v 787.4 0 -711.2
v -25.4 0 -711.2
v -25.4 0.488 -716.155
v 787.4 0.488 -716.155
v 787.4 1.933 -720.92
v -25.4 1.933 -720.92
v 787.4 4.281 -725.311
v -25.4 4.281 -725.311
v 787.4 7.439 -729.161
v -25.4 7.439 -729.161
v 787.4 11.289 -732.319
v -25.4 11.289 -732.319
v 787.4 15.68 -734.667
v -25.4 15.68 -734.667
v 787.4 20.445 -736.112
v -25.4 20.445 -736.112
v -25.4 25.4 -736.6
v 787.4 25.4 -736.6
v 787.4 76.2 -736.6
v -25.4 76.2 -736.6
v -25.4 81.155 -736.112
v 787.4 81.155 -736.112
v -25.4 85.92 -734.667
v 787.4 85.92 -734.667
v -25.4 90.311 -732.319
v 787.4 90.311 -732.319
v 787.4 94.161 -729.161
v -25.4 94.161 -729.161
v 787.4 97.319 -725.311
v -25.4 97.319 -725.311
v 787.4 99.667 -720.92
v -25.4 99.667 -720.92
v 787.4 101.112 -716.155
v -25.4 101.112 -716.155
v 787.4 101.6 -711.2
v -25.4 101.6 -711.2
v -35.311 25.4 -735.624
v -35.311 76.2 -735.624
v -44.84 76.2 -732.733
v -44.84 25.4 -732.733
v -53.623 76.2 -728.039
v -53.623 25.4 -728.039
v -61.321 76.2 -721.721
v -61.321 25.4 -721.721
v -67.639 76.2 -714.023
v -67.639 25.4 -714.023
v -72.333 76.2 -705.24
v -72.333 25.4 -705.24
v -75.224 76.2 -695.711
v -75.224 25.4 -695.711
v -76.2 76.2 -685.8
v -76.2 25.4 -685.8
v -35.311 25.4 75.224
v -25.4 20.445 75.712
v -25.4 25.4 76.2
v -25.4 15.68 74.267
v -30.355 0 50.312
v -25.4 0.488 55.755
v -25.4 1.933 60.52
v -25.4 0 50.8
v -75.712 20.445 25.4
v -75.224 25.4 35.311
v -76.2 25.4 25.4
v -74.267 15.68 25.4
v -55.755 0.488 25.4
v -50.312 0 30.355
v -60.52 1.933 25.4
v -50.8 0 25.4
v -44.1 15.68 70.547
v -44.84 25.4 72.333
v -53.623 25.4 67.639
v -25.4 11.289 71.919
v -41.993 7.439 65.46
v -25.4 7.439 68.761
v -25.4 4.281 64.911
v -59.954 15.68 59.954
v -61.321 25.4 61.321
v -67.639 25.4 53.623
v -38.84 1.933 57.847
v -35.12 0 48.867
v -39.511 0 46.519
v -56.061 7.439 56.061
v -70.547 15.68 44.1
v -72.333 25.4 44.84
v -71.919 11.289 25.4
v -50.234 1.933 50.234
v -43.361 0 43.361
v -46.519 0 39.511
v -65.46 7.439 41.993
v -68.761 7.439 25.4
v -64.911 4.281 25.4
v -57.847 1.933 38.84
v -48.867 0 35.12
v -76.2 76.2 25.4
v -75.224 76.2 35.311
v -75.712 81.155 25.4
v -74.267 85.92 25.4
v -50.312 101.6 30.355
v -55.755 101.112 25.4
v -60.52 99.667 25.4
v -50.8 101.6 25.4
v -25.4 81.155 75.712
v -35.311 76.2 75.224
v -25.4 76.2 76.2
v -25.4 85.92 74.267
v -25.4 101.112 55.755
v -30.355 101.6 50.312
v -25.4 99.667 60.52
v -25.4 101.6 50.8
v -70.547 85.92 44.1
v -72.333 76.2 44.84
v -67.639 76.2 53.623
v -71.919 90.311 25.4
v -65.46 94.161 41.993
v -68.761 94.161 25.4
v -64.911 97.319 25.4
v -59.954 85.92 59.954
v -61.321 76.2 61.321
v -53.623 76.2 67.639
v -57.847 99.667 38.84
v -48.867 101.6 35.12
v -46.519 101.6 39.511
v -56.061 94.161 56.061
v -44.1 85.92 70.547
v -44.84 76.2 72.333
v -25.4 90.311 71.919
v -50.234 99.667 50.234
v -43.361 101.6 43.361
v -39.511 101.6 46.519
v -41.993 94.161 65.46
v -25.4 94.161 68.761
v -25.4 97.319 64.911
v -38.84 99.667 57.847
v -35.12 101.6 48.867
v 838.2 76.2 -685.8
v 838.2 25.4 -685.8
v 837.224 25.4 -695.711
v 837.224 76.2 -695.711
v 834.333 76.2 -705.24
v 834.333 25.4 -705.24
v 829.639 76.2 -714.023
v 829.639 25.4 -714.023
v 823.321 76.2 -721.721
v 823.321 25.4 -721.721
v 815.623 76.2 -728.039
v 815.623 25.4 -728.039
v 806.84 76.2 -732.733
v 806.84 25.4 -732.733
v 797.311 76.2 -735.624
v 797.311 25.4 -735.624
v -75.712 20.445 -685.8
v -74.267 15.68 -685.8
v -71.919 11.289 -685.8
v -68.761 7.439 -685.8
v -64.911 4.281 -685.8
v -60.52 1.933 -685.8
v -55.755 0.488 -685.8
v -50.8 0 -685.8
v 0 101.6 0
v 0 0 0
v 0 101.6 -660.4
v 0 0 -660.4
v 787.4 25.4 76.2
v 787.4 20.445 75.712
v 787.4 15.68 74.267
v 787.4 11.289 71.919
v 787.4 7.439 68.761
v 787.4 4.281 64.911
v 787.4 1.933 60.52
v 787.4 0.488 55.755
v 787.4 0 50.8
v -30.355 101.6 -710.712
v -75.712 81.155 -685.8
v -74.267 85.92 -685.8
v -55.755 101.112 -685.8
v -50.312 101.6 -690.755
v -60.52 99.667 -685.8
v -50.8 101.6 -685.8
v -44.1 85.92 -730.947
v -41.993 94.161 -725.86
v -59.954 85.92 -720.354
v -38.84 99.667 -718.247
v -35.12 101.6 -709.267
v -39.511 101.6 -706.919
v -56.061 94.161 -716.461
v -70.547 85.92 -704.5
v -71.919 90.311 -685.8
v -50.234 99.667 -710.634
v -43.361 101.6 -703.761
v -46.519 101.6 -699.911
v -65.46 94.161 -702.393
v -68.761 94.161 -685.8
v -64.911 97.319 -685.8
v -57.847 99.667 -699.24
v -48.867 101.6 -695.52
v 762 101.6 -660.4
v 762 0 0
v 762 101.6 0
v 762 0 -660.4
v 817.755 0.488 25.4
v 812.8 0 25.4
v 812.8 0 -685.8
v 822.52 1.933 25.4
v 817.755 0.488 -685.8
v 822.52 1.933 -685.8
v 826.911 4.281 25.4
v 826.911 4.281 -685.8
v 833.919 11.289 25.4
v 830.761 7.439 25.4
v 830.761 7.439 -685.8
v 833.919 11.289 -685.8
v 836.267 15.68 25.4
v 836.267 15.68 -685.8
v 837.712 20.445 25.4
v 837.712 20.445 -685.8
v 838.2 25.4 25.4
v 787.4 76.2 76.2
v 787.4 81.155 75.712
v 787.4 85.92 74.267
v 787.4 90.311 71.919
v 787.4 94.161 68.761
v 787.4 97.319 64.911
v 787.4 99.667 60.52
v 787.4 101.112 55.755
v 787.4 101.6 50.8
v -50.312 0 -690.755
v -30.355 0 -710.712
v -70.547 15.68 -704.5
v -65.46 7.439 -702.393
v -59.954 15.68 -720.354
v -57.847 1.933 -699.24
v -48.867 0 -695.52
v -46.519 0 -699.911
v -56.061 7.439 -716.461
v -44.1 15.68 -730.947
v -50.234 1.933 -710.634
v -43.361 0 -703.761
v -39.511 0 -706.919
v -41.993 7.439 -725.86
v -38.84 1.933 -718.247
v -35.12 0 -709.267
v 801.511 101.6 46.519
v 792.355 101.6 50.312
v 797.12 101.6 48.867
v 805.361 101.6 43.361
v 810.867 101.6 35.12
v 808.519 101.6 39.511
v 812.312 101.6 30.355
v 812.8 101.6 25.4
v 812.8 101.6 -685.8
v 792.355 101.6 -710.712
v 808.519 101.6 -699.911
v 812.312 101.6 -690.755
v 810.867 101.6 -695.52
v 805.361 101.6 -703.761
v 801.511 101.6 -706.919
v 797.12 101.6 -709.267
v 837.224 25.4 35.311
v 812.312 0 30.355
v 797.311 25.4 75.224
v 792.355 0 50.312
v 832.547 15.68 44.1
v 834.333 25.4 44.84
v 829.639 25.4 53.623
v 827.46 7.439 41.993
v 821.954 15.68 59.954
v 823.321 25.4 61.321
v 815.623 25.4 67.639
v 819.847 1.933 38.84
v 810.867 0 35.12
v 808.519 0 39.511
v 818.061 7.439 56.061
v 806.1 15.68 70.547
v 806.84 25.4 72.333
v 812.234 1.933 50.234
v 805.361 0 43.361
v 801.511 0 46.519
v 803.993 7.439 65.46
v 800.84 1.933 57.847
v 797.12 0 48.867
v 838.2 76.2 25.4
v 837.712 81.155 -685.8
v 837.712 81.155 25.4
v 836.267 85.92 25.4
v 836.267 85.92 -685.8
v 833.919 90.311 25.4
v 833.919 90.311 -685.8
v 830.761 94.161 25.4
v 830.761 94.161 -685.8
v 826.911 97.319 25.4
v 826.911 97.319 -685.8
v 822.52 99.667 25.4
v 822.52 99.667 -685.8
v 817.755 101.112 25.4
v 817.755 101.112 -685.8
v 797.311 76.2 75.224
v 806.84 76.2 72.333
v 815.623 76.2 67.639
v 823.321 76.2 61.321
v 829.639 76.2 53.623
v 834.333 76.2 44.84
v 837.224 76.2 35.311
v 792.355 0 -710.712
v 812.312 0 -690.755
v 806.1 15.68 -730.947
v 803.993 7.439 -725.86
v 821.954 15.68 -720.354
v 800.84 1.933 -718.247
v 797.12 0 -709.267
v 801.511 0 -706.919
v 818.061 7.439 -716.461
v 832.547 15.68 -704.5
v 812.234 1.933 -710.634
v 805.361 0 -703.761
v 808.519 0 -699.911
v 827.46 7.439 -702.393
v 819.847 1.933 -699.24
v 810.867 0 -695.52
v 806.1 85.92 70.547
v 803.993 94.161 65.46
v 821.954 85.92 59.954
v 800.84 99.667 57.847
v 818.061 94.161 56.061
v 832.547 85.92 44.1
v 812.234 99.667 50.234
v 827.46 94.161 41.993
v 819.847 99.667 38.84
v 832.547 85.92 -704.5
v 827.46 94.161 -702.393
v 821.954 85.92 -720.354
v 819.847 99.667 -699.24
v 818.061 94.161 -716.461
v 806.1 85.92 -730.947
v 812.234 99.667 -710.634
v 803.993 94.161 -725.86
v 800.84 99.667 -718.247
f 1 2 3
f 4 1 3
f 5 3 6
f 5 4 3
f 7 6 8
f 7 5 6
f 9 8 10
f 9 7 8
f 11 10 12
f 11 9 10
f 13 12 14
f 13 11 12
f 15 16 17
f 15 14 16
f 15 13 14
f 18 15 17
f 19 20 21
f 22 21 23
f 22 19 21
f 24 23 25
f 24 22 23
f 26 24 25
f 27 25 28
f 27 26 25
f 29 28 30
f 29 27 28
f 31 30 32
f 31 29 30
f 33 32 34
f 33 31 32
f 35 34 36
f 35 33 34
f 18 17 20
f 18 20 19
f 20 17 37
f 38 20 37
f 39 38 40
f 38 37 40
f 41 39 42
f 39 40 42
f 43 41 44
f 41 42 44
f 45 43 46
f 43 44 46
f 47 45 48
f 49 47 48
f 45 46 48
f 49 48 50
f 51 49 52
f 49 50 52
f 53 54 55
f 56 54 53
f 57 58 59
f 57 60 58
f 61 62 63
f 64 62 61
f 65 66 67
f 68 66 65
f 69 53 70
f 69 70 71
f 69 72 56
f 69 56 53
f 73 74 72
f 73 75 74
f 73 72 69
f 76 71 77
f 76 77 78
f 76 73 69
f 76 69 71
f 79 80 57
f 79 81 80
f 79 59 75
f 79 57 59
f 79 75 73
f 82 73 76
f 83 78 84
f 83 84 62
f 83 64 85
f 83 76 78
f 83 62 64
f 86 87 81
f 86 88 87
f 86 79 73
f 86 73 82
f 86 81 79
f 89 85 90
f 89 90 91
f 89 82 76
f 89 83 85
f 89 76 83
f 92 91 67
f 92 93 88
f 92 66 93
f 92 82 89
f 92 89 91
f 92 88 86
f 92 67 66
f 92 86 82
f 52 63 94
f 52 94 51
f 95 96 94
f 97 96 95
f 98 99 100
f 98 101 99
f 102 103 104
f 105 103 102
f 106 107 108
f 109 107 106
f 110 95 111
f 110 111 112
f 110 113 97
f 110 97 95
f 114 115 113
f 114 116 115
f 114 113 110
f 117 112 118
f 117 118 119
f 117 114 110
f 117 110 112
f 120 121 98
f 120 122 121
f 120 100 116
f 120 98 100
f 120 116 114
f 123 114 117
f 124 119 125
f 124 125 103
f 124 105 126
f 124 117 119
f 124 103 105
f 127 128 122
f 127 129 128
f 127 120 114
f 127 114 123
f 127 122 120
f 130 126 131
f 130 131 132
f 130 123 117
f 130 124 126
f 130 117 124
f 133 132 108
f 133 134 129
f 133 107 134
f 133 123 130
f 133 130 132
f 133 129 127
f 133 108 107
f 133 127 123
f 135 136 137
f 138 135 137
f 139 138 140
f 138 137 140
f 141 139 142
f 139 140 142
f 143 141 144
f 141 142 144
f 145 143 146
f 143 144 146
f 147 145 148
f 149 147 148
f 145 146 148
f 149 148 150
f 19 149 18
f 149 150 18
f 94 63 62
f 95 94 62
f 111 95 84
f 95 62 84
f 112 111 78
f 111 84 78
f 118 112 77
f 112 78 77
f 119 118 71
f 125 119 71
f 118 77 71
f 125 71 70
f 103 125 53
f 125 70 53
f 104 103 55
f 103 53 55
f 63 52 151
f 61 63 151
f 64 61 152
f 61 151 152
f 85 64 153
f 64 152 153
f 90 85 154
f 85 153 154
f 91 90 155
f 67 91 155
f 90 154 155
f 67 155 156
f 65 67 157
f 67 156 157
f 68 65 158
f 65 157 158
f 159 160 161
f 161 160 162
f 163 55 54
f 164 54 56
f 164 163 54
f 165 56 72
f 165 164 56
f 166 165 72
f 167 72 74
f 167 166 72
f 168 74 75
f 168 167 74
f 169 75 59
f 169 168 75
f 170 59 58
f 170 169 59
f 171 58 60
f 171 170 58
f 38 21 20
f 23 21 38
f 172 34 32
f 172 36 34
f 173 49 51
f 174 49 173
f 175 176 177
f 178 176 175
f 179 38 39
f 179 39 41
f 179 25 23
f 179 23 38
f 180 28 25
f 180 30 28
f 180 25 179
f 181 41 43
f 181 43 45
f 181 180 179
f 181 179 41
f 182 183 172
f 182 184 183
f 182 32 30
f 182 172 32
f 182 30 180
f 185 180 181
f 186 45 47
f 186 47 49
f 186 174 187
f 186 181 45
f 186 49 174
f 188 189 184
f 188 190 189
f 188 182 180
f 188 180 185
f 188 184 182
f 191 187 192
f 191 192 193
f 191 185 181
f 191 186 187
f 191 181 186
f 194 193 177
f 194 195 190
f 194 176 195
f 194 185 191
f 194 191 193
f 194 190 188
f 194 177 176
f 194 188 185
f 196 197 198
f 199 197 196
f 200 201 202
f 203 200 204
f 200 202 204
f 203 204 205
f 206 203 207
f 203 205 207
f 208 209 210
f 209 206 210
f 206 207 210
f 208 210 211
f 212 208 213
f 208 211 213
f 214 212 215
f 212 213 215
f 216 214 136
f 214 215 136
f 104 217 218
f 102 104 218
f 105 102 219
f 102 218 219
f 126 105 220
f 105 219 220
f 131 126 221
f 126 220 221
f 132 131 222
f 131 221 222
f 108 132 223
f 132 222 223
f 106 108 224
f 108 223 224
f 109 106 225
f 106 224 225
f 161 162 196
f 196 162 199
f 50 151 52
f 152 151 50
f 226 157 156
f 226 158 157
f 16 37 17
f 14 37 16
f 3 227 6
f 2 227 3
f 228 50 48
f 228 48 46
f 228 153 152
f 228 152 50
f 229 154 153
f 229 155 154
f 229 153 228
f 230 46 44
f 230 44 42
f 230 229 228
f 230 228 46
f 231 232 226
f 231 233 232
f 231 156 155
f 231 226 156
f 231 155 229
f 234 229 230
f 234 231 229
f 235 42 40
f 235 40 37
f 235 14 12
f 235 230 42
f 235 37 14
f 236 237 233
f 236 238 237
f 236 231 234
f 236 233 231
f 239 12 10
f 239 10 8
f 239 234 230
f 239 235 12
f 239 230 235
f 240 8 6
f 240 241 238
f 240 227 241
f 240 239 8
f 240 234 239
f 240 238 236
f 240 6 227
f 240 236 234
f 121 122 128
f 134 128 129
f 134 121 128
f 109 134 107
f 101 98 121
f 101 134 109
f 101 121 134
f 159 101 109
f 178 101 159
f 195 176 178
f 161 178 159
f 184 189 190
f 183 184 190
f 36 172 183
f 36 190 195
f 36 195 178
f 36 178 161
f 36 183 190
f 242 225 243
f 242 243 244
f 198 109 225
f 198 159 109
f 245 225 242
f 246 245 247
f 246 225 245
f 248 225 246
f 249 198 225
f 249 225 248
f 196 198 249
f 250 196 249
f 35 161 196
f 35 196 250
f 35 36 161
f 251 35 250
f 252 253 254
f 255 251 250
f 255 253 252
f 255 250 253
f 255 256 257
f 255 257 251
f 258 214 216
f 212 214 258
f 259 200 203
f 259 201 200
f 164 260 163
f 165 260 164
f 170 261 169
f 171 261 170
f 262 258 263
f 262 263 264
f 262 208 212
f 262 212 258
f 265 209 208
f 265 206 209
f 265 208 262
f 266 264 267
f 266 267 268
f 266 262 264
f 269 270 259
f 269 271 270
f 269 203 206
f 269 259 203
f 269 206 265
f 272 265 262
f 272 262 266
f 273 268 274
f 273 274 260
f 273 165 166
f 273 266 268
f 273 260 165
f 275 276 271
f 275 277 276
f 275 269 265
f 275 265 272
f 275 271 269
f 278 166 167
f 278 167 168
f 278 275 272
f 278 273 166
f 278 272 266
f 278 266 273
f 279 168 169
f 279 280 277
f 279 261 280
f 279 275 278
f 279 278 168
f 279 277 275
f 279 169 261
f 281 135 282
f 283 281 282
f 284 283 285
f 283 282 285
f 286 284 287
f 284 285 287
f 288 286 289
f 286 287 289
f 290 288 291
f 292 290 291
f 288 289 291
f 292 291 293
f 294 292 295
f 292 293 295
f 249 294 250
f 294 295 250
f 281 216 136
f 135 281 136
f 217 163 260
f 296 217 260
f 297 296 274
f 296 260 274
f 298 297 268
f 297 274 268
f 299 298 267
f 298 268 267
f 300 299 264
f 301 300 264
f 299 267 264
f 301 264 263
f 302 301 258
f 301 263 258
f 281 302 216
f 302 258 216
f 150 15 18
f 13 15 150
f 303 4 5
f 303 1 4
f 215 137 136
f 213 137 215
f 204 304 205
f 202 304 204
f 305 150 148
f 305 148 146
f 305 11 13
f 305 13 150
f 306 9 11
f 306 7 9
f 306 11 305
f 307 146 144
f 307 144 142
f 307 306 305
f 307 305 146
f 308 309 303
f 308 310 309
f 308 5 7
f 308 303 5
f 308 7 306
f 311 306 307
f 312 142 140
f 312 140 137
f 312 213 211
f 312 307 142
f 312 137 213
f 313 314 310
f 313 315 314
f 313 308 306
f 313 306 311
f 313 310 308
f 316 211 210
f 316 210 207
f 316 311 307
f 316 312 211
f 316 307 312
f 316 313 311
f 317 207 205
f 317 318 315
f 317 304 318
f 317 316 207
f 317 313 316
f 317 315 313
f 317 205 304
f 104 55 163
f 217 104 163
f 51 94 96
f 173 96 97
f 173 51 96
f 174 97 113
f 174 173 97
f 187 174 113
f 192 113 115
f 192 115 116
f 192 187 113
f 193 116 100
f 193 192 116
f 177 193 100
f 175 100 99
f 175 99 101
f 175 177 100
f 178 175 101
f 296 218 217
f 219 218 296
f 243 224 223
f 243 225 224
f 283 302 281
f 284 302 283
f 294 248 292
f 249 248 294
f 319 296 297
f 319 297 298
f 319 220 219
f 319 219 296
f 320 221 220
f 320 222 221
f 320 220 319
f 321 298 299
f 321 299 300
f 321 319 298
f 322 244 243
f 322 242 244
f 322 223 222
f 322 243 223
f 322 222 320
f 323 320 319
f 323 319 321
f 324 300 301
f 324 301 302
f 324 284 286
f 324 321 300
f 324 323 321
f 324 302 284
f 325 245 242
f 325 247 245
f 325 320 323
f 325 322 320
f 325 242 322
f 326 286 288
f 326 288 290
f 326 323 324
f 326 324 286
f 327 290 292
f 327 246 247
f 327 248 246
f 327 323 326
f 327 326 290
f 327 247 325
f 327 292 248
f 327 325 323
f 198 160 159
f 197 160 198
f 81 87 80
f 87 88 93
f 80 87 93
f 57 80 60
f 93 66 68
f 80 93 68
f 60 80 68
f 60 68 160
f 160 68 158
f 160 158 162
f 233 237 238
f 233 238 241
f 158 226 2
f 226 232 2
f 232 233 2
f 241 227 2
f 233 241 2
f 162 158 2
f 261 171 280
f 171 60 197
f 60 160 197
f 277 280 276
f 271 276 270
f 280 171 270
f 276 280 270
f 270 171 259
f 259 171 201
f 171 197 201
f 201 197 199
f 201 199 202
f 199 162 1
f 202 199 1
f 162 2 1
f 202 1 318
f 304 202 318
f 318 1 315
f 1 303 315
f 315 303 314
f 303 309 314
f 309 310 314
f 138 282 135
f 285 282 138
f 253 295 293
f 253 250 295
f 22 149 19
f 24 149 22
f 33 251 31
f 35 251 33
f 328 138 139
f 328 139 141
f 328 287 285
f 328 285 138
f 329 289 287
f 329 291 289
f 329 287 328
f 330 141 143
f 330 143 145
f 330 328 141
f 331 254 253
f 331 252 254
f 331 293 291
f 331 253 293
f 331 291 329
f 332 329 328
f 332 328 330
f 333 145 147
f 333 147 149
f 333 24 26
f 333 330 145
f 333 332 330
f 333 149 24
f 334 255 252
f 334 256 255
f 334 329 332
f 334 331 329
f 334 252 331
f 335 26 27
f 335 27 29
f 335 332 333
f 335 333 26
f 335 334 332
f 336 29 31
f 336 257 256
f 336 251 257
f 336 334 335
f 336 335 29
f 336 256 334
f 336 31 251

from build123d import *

# Parameters (mm, degrees)
SKETCH1_W           = 914.4
SKETCH1_H           = 812.8
SKETCH1_W_2         = 762
SKETCH1_H_2         = 660.4
BOSS_EXTRUDE1_DEPTH = 101.6
FILLET1_R           = 25.4
FILLET2_R           = 25.4
FILLET3_R           = 50.8


with BuildPart() as part:
    # Sketch1 → Boss-Extrude1 (new body)
    with BuildSketch(Plane(origin=(0, 0, 0), x_dir=(1, 0, 0), z_dir=(0, 1, 0))):
        with Locations((381, 330.2)):
            Rectangle(SKETCH1_W, SKETCH1_H)
        with Locations((381, 330.2)):
            Rectangle(SKETCH1_W_2, SKETCH1_H_2, mode=Mode.SUBTRACT)
    extrude(amount=BOSS_EXTRUDE1_DEPTH)

    # Fillet1
    fillet1_edges = [part.edges().sort_by_distance(p)[0] for p in [
        (381, 101.6, -736.6),
        (-76.2, 101.6, -330.2),
        (381, 101.6, 76.2),
        (838.2, 101.6, -330.2),
    ]]
    fillet(fillet1_edges, radius=FILLET1_R)

    # Fillet2
    fillet2_edges = [part.edges().sort_by_distance(p)[0] for p in [
        (-76.2, 0, -330.2),
        (381, 0, -736.6),
        (838.2, 0, -330.2),
        (381, 0, 76.2),
    ]]
    fillet(fillet2_edges, radius=FILLET2_R)

    # Fillet3
    # the kernel refuses this fillet: 50.8 mm, written as the material it takes off along each edge
    with BuildSketch(Plane(origin=(-25.4, 101.6, -685.8), x_dir=(0, 0, -1), z_dir=(1, 0, 0))) as fillet3_piece_1:
        with BuildLine():
            CenterArc((25.4, -25.4), 25.4, 0, 90)
            Line((50.8, -25.4), (50.8, 0))
            Line((50.8, 0), (25.4, 0))
        make_face()
    revolve(axis=Axis((-25.4, 101.6, -685.8), (0, 1, 0)), revolution_arc=90, mode=Mode.SUBTRACT)
    with BuildSketch(Plane(origin=(787.4, 101.6, -685.8), x_dir=(1, 0, 0), z_dir=(0, 0, 1))) as fillet3_piece_2:
        with BuildLine():
            CenterArc((25.4, -25.4), 25.4, 0, 90)
            Line((50.8, -25.4), (50.8, 0))
            Line((50.8, 0), (25.4, 0))
        make_face()
    revolve(axis=Axis((787.4, 101.6, -685.8), (0, 1, 0)), revolution_arc=90, mode=Mode.SUBTRACT)
    with BuildSketch(Plane(origin=(-25.4, 101.6, 25.4), x_dir=(-1, 0, 0), z_dir=(0, 0, -1))) as fillet3_piece_3:
        with BuildLine():
            CenterArc((25.4, -25.4), 25.4, 0, 90)
            Line((50.8, -25.4), (50.8, 0))
            Line((50.8, 0), (25.4, 0))
        make_face()
    revolve(axis=Axis((-25.4, 101.6, 25.4), (0, 1, 0)), revolution_arc=90, mode=Mode.SUBTRACT)
    with BuildSketch(Plane(origin=(787.4, 101.6, 25.4), x_dir=(0, 0, 1), z_dir=(-1, 0, 0))) as fillet3_piece_4:
        with BuildLine():
            CenterArc((25.4, -25.4), 25.4, 0, 90)
            Line((50.8, -25.4), (50.8, 0))
            Line((50.8, 0), (25.4, 0))
        make_face()
    revolve(axis=Axis((787.4, 101.6, 25.4), (0, 1, 0)), revolution_arc=90, mode=Mode.SUBTRACT)
    with BuildSketch(Plane(origin=(787.4, 0, 25.4), x_dir=(1, 0, 0), z_dir=(0, 0, -1))) as fillet3_piece_5:
        with BuildLine():
            CenterArc((25.4, -25.4), 25.4, 0, 90)
            Line((50.8, -25.4), (50.8, 0))
            Line((50.8, 0), (25.4, 0))
        make_face()
    revolve(axis=Axis((787.4, 0, 25.4), (0, -1, 0)), revolution_arc=90, mode=Mode.SUBTRACT)
    with BuildSketch(Plane(origin=(-25.4, 0, 25.4), x_dir=(0, 0, 1), z_dir=(1, 0, 0))) as fillet3_piece_6:
        with BuildLine():
            CenterArc((25.4, -25.4), 25.4, 0, 90)
            Line((50.8, -25.4), (50.8, 0))
            Line((50.8, 0), (25.4, 0))
        make_face()
    revolve(axis=Axis((-25.4, 0, 25.4), (0, -1, 0)), revolution_arc=90, mode=Mode.SUBTRACT)
    with BuildSketch(Plane(origin=(787.4, 0, -685.8), x_dir=(0, 0, -1), z_dir=(-1, 0, 0))) as fillet3_piece_7:
        with BuildLine():
            CenterArc((25.4, -25.4), 25.4, 0, 90)
            Line((50.8, -25.4), (50.8, 0))
            Line((50.8, 0), (25.4, 0))
        make_face()
    revolve(axis=Axis((787.4, 0, -685.8), (0, -1, 0)), revolution_arc=90, mode=Mode.SUBTRACT)
    with BuildSketch(Plane(origin=(-25.4, 0, -685.8), x_dir=(-1, 0, 0), z_dir=(0, 0, 1))) as fillet3_piece_8:
        with BuildLine():
            CenterArc((25.4, -25.4), 25.4, 0, 90)
            Line((50.8, -25.4), (50.8, 0))
            Line((50.8, 0), (25.4, 0))
        make_face()
    revolve(axis=Axis((-25.4, 0, -685.8), (0, -1, 0)), revolution_arc=90, mode=Mode.SUBTRACT)
    with BuildSketch(Plane(origin=(838.2, 0, 76.2), x_dir=(-1, 0, 0), z_dir=(0, 1, 0)), Plane(origin=(-76.2, 0, 76.2), x_dir=(0, 0, -1), z_dir=(0, 1, 0))) as fillet3_piece_9:
        with BuildLine():
            CenterArc((FILLET3_R, -FILLET3_R), FILLET3_R, 90, 90)
            Line((0, -FILLET3_R), (0, 0))
            Line((0, 0), (FILLET3_R, 0))
        make_face()
    extrude(amount=101.6, mode=Mode.SUBTRACT)
    with BuildSketch(Plane(origin=(838.2, 0, -736.6), x_dir=(-1, 0, 0), z_dir=(0, 1, 0)), Plane(origin=(-76.2, 0, -736.6), x_dir=(0, 0, 1), z_dir=(0, 1, 0))) as fillet3_piece_10:
        with BuildLine():
            CenterArc((FILLET3_R, FILLET3_R), FILLET3_R, 180, 90)
            Line((0, FILLET3_R), (0, 0))
            Line((0, 0), (FILLET3_R, 0))
        make_face()
    extrude(amount=101.6, mode=Mode.SUBTRACT)


solid = part.part
